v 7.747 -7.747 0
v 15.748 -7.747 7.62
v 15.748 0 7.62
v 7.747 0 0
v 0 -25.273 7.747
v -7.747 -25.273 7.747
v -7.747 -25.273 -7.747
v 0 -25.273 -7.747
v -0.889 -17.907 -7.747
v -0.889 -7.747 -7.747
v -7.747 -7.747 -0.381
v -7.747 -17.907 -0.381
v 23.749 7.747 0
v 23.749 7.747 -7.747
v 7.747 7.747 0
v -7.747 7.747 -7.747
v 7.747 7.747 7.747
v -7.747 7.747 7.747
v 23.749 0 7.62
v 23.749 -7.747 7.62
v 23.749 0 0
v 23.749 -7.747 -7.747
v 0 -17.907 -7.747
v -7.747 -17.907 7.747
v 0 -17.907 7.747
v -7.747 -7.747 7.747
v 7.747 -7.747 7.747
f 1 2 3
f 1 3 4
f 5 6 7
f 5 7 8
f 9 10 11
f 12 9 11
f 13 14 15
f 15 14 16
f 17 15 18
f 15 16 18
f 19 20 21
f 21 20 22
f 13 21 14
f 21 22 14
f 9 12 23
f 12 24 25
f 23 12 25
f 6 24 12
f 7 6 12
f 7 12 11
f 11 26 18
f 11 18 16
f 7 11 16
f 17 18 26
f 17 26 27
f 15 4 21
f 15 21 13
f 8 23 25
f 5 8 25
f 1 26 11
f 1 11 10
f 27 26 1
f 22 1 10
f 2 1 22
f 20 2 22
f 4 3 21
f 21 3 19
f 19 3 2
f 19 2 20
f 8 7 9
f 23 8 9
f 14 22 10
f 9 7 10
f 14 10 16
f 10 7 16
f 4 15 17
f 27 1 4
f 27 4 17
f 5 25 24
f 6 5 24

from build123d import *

# Parameters (mm, degrees)
F0_W      = 15.494
F0_H      = 15.494
F1_DEPTH  = 7.747
F3_DEPTH  = 10.16
F5_DEPTH  = 7.366
F6_W      = 15.494
F6_H      = 7.747
F7_DEPTH  = 16.002
F8_W      = 8.001
F8_H      = 7.747
F9_DEPTH  = 7.62
F11_DEPTH = 7.747


with BuildPart() as f1:
    # F0 (on Front) → F1 (new body, symmetric)
    with BuildSketch(Plane.XZ):
        Rectangle(F0_W, F0_H)
    extrude(amount=F1_DEPTH, both=True)

    # F2 (on face) → F3 (join)
    with BuildSketch(Plane.XZ.offset(7.747)):
        Polygon((-7.747, -0.381), (-7.747, -7.747), (-0.889, -7.747), align=None)
    extrude(amount=F3_DEPTH)

    # F4 (on face) → F5 (join)
    with BuildSketch(Plane.XZ.offset(17.907)):
        Polygon((0, -7.747), (0, 7.747), (-7.747, 7.747), (-7.747, -7.747), (-0.889, -7.747), align=None)
    extrude(amount=F5_DEPTH)

    # F6 (on face) → F7 (join)
    with BuildSketch(Plane.YZ.offset(7.747)):
        with Locations((0, -3.8735)):
            Rectangle(F6_W, F6_H)
    extrude(amount=F7_DEPTH)

    # F8 (on face) → F9 (join)
    with BuildSketch(Plane.XY):
        with Locations((19.7485, -3.8735)):
            Rectangle(F8_W, F8_H)
    extrude(amount=F9_DEPTH)

    # F10 (on face) → F11 (join)
    with BuildSketch(Plane.XZ.offset(7.747)):
        Polygon((15.748, 7.62), (7.747, 0), (15.748, 0), align=None)
    extrude(amount=-F11_DEPTH)


solid = f1.part
